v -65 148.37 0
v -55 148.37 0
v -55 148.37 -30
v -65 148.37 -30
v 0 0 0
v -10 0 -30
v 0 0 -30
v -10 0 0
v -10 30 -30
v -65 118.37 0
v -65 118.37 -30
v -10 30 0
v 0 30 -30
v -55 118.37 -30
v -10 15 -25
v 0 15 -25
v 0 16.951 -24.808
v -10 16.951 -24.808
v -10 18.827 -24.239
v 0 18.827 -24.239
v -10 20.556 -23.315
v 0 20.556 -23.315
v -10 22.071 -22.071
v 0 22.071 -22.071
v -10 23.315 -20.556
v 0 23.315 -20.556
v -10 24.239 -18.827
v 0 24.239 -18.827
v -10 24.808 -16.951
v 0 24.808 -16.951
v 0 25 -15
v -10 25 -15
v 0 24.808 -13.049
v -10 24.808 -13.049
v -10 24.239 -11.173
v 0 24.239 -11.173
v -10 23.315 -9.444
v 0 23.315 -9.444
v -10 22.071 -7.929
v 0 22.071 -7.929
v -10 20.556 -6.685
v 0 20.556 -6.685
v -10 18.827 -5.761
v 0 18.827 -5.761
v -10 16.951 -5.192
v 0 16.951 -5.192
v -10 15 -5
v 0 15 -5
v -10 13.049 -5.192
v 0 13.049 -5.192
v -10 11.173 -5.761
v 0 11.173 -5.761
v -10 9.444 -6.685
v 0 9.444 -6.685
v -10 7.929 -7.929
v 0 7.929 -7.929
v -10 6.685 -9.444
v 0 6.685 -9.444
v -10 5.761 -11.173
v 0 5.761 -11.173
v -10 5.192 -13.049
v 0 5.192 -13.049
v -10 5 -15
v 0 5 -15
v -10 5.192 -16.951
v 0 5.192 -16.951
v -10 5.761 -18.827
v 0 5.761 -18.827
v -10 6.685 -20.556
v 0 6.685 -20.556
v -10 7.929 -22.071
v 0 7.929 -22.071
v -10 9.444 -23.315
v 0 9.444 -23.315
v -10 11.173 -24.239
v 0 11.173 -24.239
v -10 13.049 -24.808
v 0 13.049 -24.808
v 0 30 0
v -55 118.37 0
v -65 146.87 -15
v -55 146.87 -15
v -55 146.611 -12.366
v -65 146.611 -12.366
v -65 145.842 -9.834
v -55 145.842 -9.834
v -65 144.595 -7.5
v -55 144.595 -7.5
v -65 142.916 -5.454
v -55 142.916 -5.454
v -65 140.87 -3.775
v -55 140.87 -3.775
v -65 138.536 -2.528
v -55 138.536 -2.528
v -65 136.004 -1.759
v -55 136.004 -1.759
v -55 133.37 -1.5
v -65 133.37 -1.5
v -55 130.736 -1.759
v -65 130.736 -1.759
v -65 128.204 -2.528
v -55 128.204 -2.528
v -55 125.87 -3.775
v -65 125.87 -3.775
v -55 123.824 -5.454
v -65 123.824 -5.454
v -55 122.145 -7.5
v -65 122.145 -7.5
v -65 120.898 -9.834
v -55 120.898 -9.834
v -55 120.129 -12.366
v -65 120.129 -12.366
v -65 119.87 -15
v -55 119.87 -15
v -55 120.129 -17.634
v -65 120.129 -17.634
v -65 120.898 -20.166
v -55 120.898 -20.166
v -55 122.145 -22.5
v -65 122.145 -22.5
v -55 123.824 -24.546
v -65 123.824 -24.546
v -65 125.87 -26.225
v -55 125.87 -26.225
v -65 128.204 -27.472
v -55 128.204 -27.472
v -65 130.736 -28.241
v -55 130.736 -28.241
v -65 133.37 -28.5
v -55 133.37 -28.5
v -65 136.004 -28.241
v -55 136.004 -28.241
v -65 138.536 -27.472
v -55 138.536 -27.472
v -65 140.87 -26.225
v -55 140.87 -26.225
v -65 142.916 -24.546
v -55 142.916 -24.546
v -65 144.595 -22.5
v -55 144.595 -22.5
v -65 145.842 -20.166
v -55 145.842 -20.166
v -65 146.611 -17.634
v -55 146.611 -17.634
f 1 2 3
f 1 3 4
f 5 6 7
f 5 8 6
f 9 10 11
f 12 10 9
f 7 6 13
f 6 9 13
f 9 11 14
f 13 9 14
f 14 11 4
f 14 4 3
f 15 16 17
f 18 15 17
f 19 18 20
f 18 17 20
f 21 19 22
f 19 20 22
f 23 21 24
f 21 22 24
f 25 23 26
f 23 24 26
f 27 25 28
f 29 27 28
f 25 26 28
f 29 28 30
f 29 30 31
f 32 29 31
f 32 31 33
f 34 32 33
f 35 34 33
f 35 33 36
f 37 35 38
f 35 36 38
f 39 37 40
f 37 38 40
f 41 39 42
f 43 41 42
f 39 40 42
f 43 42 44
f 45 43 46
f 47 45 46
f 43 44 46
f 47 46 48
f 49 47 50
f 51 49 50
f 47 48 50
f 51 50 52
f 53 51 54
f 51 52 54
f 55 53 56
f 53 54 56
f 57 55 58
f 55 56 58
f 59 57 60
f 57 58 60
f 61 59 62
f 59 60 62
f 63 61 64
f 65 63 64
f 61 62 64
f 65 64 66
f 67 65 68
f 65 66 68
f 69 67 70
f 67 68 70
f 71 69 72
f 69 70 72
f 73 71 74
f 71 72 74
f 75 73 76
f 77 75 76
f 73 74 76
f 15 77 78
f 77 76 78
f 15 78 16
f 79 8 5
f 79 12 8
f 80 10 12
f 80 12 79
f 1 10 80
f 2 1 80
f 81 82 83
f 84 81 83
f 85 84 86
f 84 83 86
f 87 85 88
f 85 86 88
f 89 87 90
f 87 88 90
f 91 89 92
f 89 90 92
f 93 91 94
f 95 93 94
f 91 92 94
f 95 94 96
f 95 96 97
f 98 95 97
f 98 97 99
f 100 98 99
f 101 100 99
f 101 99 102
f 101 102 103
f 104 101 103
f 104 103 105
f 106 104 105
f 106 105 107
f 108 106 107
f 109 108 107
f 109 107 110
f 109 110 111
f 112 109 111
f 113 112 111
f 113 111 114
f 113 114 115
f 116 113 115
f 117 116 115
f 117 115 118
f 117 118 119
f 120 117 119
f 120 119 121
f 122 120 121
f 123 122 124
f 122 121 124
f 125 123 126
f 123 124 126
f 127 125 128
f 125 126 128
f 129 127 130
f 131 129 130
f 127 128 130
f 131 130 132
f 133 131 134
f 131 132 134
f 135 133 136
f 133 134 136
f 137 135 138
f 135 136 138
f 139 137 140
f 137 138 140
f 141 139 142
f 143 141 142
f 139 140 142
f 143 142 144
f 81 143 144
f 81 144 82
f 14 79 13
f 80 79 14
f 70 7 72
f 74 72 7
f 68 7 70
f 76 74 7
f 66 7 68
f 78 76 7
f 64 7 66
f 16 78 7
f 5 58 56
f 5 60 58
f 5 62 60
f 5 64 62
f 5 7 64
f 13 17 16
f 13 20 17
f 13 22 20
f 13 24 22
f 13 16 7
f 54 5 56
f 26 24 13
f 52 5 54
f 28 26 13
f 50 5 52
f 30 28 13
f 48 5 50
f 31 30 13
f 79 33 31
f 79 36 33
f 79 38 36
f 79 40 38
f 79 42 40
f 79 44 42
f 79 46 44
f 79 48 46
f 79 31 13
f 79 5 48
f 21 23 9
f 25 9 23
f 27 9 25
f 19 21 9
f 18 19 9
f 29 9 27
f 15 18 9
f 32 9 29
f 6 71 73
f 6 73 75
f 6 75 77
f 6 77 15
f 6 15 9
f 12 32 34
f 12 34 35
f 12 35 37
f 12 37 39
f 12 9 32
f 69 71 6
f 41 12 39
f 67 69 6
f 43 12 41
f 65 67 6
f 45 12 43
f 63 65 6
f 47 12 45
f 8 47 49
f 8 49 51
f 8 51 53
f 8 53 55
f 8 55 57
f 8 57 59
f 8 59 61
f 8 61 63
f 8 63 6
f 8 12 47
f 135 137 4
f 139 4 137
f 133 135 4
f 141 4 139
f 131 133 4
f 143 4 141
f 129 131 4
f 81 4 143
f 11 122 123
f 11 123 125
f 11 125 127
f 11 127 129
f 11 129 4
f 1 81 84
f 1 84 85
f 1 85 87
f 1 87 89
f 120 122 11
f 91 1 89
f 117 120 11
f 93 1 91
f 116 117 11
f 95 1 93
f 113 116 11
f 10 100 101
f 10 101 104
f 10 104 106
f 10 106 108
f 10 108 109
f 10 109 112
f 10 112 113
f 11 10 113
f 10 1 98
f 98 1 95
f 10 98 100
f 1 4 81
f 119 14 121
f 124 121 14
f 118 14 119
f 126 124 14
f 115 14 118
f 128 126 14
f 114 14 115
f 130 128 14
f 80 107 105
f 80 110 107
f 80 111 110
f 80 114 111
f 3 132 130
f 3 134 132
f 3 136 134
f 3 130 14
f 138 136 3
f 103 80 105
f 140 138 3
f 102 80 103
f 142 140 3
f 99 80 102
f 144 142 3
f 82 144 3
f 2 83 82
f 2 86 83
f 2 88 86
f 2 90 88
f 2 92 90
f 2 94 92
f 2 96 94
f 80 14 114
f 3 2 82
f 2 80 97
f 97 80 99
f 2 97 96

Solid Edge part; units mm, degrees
sketch "Sketch1" plane through (0, 0, 0) normal (0, 0, 1) x (1, 0, 0)
  line L0 (-65, 148.37) -> (-65, 118.37)
  line L1 (-65, 118.37) -> (-10, 30)
  line L2 (-10, 30) -> (-10, 0)
  line L3 (-10, 0) -> (0, 0)
  line L4 (0, 0) -> (0, 30)
  line L5 (0, 30) -> (-55, 118.37)
  line L6 (-55, 118.37) -> (-55, 148.37)
  line L7 (-55, 148.37) -> (-65, 148.37)
  dimension "D1" = 10
  dimension "D2" = 10
  dimension "D3" = 30
  dimension "D4" = 30
  dimension "D5" = 55
  dimension "D6" = 118.37
extrude "Protrusion1" add sketch "Sketch1" against normal blind 30
sketch "Sketch2" plane through (-55, 32.2656, -20) normal (1, 0, 0) x (0, 1, 0)
  circle A0 centre (101.1044, 5) radius 13.5
  dimension "D1" = 27
extrude "Cutout1" cut sketch "Sketch2" against normal up to next
sketch "Sketch3" plane through (0, 15, -15) normal (1, 0, 0) x (0, 0, -1)
  circle A0 centre (0, 0) radius 10
  dimension "D1" = 20
extrude "Cutout2" cut sketch "Sketch3" against normal up to next
